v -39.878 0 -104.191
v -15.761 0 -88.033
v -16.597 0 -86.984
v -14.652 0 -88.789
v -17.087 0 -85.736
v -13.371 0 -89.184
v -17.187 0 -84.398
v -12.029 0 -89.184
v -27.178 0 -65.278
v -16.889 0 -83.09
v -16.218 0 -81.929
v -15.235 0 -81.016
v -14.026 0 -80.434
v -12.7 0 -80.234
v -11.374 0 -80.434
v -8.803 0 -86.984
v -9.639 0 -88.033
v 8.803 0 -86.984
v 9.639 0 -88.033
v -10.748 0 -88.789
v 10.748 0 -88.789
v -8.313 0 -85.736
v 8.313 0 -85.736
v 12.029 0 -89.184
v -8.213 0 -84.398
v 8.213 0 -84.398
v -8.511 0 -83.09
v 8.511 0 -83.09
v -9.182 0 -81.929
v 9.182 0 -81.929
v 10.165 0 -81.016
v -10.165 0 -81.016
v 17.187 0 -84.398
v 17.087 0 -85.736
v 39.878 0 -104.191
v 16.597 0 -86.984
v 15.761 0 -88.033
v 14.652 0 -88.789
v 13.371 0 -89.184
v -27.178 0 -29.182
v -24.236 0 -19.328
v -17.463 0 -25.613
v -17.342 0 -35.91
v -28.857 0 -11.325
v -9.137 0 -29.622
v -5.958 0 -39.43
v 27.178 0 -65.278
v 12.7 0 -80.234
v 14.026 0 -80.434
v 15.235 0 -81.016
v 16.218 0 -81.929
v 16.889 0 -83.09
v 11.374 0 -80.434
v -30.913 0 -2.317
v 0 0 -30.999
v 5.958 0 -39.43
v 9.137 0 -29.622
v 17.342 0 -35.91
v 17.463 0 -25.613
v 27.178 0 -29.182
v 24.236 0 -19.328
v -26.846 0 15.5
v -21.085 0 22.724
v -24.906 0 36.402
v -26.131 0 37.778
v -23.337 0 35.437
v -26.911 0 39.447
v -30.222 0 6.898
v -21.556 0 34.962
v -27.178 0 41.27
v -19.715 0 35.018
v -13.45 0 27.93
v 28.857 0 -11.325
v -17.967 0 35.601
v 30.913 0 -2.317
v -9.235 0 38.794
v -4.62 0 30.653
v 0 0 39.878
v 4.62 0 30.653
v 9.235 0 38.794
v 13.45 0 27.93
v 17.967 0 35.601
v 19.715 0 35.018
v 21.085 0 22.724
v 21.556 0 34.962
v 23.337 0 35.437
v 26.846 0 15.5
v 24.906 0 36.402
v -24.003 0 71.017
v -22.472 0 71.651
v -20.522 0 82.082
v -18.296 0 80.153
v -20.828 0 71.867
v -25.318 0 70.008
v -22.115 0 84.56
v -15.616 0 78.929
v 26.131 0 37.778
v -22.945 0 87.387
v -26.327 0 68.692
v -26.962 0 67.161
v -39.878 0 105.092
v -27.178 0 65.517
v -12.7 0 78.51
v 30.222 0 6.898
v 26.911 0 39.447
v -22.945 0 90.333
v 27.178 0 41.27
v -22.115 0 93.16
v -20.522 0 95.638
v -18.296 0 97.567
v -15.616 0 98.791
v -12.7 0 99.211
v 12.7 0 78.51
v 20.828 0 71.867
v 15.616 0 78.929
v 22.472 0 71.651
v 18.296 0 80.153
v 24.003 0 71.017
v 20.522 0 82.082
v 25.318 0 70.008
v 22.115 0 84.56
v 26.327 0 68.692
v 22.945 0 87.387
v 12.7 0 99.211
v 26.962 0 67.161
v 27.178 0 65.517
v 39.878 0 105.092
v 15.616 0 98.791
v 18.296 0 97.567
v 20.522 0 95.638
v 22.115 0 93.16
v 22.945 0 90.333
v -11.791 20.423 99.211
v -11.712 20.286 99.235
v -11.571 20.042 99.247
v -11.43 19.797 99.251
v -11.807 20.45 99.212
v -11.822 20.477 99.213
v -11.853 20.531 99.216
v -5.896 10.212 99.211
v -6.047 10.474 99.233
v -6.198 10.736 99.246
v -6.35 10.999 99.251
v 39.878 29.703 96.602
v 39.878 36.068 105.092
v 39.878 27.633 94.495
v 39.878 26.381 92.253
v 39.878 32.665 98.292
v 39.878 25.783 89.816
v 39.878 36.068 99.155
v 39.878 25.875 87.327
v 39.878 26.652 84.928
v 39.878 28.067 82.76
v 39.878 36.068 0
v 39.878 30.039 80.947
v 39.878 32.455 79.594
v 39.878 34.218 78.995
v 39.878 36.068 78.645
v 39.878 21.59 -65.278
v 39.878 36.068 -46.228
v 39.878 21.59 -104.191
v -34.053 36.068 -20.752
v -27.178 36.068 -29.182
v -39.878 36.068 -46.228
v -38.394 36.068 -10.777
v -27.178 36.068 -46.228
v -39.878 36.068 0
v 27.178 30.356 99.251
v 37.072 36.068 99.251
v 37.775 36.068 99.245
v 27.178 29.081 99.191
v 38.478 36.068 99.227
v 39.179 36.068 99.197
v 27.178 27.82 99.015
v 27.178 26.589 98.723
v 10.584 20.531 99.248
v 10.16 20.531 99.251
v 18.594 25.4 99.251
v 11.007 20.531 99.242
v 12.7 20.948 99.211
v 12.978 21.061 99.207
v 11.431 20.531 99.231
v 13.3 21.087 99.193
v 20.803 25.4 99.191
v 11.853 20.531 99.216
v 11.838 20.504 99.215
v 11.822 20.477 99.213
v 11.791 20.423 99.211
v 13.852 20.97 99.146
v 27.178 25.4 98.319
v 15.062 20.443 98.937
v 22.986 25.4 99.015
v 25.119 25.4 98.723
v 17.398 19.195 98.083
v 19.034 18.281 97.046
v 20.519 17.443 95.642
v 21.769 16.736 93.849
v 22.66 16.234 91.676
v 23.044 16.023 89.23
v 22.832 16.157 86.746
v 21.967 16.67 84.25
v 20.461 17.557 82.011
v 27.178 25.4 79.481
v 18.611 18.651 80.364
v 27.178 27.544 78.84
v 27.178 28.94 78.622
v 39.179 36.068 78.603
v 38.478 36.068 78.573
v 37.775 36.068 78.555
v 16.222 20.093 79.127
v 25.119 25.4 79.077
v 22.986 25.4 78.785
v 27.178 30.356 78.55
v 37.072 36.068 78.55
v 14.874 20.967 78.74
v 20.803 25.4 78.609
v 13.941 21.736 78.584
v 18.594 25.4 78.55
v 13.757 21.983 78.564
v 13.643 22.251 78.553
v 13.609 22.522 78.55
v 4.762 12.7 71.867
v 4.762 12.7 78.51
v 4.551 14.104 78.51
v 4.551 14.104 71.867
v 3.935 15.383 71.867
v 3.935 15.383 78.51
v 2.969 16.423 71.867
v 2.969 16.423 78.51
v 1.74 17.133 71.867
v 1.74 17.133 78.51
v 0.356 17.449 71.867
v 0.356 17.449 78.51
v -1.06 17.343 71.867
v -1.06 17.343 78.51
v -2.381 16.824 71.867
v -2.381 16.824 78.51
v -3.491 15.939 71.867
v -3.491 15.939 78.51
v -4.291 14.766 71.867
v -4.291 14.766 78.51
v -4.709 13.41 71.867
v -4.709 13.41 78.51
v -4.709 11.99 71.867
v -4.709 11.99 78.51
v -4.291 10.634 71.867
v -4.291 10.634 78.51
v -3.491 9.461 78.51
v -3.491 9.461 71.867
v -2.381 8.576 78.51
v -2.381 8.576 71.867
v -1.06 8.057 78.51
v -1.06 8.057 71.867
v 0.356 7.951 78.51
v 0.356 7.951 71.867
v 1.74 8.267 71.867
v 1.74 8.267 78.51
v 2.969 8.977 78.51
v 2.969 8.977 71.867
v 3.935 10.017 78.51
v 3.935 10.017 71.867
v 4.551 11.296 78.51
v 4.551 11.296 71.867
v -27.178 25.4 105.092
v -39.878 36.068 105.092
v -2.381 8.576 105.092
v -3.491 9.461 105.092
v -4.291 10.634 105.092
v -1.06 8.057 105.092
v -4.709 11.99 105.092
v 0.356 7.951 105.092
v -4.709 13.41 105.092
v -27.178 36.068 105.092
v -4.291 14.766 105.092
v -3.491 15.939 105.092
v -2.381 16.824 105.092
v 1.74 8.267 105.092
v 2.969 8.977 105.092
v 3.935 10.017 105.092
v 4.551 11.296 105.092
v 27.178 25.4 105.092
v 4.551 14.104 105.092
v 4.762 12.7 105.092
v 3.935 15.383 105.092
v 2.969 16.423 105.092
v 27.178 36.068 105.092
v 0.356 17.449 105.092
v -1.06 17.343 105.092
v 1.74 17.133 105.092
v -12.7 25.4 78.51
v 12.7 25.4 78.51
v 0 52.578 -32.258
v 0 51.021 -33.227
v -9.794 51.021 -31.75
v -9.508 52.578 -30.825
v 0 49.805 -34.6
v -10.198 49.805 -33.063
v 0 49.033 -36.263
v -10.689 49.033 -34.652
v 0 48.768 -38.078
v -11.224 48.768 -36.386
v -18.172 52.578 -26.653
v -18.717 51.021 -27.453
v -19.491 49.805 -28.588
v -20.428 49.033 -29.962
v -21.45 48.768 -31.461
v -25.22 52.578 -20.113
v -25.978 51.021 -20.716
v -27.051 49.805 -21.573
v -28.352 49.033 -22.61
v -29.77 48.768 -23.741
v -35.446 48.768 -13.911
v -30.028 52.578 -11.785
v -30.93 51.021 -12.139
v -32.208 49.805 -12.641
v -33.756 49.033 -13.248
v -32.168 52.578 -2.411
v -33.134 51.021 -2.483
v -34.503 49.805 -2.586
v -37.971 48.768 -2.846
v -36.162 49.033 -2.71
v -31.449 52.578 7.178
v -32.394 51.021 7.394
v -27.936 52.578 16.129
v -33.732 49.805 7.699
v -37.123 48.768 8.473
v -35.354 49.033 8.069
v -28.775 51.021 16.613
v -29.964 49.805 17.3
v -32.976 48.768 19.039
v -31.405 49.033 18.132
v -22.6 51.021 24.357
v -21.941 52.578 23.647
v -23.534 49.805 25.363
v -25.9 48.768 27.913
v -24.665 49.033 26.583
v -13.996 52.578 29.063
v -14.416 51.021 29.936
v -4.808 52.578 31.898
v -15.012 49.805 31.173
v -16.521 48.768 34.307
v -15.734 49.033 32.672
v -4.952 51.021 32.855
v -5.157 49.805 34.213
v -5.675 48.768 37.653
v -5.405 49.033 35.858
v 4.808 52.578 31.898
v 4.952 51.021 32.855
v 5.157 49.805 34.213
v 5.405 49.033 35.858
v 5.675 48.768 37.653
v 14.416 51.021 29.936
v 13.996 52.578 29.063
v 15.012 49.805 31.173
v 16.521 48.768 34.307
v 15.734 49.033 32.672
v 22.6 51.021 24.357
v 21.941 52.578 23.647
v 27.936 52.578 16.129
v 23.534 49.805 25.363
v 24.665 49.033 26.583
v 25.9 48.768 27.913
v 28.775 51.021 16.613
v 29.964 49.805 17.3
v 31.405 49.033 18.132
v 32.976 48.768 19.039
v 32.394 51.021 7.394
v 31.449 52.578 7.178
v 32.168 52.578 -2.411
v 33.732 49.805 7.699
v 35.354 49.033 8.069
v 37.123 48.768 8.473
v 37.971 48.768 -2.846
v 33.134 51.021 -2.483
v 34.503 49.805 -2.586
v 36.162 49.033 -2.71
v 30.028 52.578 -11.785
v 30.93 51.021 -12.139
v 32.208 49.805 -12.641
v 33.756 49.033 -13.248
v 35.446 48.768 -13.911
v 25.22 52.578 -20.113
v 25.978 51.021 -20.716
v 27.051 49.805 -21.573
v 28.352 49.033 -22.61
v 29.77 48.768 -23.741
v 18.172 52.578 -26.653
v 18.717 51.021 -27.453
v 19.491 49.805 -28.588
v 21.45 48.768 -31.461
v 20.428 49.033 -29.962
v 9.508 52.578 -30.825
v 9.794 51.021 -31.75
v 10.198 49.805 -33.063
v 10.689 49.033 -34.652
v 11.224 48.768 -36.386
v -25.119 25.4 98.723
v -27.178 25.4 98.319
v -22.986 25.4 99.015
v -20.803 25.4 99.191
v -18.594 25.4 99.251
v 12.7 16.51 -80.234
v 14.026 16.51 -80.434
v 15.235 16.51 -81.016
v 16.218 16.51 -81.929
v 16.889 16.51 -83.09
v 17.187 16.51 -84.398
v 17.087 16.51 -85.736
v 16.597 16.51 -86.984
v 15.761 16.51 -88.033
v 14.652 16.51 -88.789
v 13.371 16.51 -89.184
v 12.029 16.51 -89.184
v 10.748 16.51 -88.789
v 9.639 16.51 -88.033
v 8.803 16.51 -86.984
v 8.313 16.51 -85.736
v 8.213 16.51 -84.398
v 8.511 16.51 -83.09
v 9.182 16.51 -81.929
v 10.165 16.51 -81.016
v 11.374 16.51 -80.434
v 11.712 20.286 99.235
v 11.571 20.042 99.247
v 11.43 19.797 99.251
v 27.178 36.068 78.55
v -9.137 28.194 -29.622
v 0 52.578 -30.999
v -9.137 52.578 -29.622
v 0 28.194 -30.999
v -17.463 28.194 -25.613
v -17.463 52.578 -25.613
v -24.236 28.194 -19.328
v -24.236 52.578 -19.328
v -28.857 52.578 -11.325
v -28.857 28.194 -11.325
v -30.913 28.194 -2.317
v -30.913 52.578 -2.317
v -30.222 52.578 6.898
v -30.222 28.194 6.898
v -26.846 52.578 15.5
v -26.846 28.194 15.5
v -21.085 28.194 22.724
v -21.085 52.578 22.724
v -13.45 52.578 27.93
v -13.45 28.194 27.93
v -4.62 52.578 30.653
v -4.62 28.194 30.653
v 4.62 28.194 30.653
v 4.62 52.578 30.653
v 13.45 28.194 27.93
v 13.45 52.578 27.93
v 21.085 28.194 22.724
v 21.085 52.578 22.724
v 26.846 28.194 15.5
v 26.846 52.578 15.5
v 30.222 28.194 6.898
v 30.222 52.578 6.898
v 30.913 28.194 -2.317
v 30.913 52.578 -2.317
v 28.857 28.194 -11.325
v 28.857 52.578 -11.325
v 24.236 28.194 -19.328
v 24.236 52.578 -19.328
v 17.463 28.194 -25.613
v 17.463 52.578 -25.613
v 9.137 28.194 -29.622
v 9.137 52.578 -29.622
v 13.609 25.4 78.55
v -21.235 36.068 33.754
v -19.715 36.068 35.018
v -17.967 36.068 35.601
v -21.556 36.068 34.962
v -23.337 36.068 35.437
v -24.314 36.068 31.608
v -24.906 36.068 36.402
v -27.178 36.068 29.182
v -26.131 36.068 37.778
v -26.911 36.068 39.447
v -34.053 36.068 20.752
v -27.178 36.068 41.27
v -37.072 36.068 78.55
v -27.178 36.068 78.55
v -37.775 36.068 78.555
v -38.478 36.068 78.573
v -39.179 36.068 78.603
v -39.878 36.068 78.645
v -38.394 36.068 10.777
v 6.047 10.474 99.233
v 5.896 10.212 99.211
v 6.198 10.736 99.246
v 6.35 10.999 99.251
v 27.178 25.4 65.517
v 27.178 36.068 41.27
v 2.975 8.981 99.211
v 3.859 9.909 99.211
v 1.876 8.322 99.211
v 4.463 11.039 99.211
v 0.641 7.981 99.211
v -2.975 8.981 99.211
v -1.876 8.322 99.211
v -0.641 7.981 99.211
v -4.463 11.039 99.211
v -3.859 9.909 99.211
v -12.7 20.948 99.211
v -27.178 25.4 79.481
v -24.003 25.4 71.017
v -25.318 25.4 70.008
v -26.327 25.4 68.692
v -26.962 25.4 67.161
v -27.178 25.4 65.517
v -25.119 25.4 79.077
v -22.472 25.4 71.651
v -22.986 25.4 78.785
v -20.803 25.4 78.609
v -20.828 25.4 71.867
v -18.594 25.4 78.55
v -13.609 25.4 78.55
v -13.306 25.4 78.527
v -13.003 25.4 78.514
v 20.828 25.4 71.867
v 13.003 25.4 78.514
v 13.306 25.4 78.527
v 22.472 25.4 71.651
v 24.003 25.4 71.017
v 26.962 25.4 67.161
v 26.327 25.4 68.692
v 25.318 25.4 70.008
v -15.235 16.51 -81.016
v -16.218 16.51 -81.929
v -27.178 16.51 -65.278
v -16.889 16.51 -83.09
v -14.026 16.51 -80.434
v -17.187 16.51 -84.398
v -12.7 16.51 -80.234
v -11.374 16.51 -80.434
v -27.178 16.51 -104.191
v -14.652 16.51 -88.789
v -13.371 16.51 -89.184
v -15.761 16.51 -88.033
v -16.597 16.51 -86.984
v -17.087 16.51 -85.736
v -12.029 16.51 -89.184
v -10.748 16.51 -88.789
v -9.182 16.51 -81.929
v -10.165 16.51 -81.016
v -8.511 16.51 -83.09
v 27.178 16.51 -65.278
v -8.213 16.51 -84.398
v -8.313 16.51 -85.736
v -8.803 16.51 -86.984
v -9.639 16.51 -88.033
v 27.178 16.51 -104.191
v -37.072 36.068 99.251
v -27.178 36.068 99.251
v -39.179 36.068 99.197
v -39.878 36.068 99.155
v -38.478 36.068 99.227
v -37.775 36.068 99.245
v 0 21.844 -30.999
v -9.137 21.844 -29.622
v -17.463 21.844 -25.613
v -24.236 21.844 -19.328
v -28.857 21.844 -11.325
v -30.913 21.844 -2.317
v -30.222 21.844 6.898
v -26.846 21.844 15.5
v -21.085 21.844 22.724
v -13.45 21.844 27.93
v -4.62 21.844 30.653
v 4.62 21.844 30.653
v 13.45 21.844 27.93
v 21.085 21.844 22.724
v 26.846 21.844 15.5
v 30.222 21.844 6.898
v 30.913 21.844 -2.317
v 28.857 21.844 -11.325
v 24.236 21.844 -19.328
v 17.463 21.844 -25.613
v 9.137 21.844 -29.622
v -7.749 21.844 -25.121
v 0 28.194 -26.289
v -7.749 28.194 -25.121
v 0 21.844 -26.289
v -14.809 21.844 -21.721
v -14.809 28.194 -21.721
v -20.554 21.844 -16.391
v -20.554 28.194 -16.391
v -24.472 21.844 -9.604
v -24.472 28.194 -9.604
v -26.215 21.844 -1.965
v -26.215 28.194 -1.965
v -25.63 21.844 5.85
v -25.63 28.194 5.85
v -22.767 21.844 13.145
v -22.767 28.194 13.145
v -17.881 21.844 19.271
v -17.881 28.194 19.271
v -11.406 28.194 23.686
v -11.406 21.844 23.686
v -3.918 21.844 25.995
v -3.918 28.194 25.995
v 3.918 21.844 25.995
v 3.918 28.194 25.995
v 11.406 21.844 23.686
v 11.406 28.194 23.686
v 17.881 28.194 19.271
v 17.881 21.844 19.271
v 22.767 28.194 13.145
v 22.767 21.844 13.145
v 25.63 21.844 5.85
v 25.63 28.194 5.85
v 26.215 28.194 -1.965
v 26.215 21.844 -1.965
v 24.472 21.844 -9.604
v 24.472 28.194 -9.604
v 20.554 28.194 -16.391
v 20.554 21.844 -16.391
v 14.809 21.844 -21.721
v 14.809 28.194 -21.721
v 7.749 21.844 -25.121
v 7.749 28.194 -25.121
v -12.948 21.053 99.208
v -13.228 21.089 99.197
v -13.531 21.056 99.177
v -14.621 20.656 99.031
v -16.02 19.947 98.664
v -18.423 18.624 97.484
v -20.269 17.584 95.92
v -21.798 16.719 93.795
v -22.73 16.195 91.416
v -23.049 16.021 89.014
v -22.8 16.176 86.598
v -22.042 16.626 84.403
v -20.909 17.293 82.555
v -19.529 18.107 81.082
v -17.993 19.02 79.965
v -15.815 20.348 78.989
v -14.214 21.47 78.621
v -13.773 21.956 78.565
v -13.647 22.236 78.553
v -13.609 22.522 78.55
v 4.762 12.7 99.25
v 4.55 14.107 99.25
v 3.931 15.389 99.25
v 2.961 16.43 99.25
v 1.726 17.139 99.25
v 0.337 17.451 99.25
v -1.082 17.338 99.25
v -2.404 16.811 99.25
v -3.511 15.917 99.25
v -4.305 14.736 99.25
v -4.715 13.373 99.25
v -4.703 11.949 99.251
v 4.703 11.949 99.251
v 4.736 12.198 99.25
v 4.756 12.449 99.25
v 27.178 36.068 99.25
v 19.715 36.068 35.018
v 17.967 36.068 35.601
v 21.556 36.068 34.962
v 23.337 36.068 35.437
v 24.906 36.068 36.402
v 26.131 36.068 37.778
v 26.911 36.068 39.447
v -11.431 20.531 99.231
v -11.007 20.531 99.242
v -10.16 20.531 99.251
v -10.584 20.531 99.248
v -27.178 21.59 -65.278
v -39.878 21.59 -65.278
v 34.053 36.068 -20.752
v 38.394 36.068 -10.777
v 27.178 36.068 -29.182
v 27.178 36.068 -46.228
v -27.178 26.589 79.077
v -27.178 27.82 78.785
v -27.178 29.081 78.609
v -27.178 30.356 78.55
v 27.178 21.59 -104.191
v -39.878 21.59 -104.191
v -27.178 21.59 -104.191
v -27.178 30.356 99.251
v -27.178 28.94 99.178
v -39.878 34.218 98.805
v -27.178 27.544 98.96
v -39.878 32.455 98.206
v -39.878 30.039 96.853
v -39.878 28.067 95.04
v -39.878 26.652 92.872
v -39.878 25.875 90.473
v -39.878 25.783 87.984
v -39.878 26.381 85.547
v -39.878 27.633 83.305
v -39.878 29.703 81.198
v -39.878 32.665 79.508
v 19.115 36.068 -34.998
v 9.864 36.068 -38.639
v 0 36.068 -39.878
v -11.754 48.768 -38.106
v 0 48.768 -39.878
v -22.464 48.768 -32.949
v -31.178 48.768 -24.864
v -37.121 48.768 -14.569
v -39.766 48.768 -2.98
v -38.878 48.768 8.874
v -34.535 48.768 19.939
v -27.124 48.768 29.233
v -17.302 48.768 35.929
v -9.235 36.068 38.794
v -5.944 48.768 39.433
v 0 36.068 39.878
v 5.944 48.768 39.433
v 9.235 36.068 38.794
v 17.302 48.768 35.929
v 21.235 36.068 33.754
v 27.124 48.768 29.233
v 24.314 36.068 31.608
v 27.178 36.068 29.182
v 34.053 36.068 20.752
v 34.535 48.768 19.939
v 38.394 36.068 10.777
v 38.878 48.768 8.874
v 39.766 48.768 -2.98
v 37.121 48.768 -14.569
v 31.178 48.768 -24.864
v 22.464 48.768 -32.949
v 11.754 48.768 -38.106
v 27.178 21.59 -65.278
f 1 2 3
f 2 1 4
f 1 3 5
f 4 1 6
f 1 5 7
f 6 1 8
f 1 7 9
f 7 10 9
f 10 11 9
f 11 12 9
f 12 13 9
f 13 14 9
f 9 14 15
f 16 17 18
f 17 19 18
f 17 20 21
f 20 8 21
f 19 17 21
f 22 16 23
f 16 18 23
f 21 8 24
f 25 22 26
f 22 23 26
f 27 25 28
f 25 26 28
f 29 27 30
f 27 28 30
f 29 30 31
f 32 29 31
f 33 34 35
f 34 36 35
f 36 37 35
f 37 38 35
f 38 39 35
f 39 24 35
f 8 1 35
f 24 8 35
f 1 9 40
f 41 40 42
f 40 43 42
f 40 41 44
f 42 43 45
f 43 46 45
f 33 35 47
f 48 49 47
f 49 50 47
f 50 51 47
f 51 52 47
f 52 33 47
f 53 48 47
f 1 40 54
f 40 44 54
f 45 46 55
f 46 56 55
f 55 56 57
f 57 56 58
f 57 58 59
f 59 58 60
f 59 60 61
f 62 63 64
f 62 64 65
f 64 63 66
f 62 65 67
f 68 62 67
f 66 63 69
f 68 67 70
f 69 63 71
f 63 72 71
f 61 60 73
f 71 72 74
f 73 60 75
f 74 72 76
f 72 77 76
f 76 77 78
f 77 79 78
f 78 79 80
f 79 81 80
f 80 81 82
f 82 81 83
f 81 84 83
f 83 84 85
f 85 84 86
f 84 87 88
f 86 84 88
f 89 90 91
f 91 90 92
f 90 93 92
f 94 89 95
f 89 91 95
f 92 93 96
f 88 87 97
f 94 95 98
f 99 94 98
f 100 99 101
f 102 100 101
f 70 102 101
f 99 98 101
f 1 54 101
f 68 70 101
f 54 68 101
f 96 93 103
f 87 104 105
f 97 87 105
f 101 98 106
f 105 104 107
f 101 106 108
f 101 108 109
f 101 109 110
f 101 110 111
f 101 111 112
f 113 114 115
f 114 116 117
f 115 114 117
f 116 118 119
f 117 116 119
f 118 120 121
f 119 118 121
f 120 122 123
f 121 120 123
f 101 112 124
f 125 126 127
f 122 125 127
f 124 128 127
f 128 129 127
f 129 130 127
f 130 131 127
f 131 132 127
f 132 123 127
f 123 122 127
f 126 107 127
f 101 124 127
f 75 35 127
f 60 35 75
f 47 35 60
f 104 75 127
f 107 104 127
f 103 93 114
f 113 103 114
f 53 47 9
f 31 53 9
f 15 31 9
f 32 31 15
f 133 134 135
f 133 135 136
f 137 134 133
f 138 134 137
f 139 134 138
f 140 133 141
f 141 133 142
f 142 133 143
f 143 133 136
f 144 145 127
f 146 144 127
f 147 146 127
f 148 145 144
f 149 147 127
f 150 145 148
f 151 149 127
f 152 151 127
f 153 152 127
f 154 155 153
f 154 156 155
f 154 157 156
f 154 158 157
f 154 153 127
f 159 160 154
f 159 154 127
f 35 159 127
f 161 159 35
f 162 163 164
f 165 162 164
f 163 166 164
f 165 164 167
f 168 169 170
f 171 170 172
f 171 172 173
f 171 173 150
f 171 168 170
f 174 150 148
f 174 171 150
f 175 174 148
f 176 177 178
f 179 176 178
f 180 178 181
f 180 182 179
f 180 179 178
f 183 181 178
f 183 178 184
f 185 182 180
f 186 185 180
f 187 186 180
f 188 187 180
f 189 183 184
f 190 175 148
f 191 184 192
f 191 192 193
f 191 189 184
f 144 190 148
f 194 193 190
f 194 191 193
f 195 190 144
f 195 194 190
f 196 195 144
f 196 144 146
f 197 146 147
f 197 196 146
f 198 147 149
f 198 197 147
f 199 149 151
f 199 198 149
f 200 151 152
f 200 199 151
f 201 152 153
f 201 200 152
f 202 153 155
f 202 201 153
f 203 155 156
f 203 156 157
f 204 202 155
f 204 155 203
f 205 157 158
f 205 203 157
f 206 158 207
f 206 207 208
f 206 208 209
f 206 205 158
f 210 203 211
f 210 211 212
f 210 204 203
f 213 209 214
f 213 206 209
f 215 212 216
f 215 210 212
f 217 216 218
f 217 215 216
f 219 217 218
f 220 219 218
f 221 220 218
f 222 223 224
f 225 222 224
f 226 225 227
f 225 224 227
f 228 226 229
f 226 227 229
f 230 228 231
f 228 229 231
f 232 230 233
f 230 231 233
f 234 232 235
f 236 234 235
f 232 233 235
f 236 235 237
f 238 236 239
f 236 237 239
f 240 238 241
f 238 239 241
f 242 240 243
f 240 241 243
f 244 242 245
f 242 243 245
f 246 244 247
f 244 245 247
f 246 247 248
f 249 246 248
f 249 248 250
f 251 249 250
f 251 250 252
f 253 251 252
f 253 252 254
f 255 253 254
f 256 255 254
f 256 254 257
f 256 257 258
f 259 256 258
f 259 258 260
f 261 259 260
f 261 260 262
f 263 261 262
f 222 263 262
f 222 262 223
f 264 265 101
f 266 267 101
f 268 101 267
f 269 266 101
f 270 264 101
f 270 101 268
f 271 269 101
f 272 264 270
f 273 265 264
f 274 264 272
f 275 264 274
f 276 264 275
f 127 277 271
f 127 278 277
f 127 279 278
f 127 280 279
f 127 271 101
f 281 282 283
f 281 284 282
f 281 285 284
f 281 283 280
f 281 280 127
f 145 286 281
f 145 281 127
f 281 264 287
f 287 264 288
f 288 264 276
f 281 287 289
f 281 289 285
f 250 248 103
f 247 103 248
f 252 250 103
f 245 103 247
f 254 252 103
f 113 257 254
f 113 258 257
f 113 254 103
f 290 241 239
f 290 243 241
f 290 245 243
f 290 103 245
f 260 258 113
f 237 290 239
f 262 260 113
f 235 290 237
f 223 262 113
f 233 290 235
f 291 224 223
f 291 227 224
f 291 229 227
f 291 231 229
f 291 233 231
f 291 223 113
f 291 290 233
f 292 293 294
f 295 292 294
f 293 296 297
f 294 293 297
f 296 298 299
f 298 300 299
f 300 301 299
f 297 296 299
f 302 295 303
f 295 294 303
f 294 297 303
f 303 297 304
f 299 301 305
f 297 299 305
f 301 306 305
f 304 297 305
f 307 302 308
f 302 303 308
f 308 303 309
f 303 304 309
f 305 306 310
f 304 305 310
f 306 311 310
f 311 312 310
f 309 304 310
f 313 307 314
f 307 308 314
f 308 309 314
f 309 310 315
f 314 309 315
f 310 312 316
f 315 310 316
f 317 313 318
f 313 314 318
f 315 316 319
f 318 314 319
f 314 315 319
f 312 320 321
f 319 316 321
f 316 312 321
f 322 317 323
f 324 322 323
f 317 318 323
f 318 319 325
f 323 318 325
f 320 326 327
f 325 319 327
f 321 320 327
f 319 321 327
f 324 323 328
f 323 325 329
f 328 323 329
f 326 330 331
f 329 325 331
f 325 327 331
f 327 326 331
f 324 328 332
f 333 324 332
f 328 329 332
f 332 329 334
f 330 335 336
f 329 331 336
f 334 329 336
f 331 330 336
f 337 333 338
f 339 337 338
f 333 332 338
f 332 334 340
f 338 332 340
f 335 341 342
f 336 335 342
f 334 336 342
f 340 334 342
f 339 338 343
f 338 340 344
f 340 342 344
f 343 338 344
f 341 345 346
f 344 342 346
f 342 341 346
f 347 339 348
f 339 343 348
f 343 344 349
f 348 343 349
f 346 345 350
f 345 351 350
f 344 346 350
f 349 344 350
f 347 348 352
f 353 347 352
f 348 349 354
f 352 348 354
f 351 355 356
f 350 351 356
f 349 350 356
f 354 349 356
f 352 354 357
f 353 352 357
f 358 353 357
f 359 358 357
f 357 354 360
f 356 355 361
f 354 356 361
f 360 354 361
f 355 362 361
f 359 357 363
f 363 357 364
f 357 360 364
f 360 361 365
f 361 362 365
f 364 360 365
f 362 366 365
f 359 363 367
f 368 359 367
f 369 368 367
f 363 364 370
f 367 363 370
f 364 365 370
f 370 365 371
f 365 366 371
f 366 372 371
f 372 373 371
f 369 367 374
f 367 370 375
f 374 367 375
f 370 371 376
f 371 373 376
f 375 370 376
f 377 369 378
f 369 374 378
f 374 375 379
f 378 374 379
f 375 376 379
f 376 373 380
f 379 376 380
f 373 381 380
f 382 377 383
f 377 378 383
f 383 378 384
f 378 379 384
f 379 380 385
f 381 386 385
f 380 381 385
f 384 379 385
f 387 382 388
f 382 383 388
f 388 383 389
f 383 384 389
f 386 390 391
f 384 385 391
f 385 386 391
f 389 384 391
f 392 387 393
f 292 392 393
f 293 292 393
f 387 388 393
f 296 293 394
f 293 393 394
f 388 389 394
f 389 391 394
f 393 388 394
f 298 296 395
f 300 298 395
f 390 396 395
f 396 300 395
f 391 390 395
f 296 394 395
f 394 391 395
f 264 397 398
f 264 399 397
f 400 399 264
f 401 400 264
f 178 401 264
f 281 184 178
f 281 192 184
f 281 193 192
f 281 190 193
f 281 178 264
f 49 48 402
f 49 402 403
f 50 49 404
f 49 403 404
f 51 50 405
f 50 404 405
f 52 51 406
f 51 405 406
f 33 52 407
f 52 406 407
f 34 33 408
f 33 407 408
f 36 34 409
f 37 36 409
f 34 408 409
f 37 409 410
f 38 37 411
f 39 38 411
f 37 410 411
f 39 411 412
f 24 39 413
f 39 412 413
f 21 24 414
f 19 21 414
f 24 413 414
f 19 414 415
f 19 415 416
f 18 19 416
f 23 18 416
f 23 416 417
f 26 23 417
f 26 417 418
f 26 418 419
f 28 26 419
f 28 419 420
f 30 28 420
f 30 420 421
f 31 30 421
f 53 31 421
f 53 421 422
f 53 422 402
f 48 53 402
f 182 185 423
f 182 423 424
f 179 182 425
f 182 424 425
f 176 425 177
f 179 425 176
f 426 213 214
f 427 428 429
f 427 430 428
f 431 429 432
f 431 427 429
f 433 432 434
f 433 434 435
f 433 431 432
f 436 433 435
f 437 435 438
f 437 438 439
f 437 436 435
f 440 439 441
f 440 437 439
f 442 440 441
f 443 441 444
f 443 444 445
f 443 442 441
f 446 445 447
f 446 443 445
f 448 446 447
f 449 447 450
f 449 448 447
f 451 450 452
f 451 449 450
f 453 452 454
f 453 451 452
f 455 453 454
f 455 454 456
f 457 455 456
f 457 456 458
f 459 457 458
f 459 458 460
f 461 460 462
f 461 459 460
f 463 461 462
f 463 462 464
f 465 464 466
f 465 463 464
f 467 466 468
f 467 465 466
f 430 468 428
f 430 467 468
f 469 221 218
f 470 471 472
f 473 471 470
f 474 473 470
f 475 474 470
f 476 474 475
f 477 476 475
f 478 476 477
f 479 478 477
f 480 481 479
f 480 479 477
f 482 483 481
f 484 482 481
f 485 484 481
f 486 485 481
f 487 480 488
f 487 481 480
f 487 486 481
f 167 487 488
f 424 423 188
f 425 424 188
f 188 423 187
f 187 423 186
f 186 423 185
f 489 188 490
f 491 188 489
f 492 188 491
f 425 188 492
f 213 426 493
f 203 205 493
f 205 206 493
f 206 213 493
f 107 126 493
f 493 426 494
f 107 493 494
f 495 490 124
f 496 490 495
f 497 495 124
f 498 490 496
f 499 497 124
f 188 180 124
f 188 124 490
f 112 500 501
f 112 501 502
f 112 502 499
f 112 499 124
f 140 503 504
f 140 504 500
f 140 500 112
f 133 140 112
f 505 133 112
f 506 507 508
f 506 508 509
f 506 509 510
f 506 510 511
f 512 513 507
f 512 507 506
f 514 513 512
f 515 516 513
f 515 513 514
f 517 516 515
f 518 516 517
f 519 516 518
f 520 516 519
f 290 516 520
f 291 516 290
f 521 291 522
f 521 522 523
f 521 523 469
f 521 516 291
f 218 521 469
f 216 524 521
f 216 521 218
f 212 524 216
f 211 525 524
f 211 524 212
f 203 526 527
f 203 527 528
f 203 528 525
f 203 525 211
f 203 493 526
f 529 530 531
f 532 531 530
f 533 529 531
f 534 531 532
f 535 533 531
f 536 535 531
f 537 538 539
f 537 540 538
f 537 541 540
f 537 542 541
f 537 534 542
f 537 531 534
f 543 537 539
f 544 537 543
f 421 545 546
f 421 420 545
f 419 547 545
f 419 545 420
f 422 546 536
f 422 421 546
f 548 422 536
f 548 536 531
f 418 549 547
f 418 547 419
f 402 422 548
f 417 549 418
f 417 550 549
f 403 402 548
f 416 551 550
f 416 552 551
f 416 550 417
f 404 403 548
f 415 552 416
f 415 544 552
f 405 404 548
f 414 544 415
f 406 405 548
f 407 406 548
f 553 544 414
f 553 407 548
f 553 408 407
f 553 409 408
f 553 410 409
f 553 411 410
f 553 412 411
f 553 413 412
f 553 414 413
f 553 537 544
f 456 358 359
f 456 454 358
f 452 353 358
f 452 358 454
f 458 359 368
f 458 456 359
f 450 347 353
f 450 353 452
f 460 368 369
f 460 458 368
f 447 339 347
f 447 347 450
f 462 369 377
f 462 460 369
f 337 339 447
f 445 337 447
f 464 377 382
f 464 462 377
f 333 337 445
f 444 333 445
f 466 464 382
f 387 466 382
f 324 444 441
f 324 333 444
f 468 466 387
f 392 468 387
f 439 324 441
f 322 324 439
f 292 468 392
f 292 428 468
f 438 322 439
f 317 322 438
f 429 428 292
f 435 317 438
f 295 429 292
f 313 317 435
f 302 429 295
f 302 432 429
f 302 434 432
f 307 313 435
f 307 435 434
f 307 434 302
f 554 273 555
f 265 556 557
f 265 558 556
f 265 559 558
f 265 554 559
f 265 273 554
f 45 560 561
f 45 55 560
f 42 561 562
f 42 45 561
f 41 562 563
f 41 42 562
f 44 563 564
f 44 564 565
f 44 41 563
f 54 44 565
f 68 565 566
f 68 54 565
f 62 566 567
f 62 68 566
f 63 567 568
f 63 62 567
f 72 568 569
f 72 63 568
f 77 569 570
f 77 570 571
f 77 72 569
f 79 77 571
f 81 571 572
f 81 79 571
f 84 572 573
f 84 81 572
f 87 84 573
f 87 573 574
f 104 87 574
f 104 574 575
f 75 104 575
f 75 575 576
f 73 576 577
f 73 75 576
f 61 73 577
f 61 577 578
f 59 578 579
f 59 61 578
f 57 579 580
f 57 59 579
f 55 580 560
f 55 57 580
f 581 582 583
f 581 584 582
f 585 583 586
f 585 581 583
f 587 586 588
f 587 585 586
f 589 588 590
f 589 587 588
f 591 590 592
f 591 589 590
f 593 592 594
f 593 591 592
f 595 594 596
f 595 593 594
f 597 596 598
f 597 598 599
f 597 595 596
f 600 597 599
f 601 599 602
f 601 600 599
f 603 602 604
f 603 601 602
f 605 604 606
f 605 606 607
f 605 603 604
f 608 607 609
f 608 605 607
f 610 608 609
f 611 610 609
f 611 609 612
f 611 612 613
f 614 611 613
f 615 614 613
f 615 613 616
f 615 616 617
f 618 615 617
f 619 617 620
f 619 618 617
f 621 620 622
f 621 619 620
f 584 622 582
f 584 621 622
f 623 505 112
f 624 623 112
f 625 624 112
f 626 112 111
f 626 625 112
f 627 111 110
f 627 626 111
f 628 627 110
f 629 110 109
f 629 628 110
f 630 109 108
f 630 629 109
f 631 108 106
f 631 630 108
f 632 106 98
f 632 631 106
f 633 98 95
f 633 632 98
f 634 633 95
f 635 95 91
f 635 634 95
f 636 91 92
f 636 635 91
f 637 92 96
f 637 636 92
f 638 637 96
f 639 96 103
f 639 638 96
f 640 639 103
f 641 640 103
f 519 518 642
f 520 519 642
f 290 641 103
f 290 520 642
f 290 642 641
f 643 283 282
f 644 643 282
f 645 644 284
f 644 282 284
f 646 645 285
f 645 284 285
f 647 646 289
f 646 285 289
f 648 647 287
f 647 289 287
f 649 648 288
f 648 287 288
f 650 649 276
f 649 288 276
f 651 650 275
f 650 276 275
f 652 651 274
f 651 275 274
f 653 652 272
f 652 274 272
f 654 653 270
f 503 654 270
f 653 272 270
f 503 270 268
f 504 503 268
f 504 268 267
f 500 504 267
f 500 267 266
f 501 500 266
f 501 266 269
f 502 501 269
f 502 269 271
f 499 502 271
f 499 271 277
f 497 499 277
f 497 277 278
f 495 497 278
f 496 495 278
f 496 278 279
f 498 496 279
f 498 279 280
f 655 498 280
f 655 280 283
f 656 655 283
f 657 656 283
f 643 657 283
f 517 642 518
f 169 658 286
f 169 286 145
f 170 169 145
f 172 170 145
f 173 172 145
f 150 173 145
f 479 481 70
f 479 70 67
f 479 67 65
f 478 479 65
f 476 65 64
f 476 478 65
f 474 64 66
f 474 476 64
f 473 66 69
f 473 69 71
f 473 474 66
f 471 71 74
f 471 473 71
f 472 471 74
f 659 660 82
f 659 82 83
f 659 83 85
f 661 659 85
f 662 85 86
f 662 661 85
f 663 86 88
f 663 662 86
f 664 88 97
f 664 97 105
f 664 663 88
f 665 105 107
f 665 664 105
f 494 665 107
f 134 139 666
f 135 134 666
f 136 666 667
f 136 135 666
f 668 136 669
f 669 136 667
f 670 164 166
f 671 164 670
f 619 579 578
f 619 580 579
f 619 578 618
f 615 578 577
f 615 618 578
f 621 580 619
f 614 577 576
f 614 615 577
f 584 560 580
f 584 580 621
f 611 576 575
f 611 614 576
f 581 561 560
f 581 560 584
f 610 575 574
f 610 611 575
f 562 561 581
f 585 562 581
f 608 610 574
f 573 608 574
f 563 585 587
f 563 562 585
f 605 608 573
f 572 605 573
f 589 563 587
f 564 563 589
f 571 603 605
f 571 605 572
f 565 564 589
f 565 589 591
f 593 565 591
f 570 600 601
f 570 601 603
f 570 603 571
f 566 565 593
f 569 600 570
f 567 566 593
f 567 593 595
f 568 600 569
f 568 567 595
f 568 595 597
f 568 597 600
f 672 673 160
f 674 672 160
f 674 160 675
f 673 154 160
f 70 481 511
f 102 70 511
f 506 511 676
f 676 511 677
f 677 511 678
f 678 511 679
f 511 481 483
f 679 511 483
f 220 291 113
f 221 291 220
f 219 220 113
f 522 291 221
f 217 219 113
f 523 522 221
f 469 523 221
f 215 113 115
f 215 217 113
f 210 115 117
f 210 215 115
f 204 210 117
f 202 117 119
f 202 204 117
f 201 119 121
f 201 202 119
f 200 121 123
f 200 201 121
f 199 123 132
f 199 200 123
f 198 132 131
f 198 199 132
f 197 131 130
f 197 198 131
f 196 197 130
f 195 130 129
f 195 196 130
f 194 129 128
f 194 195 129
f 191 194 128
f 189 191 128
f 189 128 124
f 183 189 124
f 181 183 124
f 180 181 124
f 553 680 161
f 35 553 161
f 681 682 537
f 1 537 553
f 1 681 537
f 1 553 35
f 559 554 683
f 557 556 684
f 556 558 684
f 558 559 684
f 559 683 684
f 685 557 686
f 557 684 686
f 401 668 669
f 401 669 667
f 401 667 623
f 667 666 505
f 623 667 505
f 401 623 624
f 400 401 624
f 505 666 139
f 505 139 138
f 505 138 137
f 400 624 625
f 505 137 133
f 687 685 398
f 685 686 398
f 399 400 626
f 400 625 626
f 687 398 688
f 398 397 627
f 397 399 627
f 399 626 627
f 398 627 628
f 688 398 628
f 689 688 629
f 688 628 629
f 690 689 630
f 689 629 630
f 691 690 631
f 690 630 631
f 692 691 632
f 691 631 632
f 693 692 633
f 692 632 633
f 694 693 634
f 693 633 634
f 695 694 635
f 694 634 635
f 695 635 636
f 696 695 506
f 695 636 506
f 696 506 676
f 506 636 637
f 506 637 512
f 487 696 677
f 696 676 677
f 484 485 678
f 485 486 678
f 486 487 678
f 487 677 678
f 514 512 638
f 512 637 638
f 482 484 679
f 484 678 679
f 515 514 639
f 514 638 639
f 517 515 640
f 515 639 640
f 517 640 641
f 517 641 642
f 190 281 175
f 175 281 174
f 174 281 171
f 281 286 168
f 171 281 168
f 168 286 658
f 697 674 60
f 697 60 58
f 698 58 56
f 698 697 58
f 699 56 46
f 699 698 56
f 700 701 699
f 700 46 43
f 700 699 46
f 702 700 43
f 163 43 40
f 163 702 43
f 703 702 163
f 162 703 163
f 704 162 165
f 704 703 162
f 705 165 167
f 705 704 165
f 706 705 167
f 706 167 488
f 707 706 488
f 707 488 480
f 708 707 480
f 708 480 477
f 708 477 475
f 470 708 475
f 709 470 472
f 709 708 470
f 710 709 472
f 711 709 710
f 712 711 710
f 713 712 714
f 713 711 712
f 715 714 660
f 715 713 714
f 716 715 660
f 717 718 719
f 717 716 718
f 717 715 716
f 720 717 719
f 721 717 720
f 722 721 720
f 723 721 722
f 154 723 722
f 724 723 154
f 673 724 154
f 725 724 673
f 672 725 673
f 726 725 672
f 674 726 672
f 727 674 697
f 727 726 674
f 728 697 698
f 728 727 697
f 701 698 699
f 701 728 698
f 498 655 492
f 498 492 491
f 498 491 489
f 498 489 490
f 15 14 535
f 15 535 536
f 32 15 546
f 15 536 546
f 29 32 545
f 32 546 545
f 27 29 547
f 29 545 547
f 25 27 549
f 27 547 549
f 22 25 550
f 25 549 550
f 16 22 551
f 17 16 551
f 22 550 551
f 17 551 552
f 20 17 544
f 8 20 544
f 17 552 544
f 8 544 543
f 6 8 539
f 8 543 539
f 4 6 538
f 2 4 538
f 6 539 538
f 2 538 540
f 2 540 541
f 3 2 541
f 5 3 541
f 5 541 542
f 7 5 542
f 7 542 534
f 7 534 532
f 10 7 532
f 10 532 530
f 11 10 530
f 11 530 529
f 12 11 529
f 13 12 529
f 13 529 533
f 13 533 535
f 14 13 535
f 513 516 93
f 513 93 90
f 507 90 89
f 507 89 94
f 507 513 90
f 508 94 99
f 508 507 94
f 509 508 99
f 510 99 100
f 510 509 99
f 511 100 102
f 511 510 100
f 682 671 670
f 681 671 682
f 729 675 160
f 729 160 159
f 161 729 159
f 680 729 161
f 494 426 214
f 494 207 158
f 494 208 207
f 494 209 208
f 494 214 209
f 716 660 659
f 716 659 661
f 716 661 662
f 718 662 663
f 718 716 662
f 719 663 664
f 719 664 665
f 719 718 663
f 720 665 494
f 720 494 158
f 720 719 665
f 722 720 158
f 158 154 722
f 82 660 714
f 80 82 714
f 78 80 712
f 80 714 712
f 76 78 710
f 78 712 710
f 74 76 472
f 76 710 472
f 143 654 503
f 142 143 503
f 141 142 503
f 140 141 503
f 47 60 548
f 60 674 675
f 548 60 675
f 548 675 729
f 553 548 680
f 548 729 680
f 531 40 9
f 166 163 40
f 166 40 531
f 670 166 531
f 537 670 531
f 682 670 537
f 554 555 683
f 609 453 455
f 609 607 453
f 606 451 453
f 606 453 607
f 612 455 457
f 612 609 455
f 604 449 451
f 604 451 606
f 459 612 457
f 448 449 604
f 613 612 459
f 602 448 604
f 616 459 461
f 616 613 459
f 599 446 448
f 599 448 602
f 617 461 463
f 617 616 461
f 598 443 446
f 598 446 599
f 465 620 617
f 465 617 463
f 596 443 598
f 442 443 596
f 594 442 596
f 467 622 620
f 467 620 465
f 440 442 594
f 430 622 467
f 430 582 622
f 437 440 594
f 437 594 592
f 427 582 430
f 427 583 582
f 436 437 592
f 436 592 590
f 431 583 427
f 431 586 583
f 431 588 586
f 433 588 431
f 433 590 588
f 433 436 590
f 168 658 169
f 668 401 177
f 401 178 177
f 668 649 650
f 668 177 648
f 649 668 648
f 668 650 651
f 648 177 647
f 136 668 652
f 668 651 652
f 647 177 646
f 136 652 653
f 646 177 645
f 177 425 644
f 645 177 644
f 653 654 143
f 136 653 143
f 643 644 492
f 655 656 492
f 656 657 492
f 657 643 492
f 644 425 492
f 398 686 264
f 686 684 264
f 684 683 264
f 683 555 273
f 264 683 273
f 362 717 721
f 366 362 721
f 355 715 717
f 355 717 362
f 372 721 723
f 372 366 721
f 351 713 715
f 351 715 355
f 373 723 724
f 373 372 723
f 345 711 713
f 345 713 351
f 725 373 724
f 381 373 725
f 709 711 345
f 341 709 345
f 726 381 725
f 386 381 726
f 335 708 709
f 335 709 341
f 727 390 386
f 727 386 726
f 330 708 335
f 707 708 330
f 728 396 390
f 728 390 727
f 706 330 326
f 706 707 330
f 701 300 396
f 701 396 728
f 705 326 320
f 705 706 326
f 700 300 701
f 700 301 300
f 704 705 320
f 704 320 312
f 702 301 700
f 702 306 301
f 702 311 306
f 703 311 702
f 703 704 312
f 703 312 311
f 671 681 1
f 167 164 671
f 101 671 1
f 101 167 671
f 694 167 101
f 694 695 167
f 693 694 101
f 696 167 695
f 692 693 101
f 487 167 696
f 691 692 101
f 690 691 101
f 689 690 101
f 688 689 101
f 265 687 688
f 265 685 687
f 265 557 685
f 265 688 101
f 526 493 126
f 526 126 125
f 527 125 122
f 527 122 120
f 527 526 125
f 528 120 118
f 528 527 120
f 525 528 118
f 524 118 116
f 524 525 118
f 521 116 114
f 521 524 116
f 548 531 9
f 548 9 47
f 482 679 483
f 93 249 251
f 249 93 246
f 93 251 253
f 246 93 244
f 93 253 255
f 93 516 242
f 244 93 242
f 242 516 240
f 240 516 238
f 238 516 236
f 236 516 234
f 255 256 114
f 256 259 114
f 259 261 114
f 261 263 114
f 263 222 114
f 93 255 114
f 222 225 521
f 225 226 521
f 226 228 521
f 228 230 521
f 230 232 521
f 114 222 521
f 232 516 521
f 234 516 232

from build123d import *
from build123d.topology import SkipClean

# Parameters (mm, degrees)
HOUSING_FILLET_LIP_R               = 6.35
UBJ_START                          = 36.068
UBJ_MATERIAL_PREP_DEPTH            = 36.068
UBJ_ARM_TK_DEPTH                   = 79.756
SKETCH32_R                         = 4.5
CAMBERBLOCK_HOLES_DEPTH            = 21.59
SKETCH28_W                         = 54.356
SKETCH28_H                         = 38.9128
UBJ_CROSS_MEMBER_TK_DEPTH          = 5.08
UBJ_MASS_CUTTING_REACH             = 119.247
LBJ_START                          = -36.068
LBJ_MATERIAL_PREP_DEPTH            = 36.068
FLAT_LBJ_PREP_DEPTH                = 10.668
LBJ_SLOT_REACH                     = 117.643
LBJ_WEIGHT_AND_BOLT_CLEARING_REACH = 117.643
LBJ_FILLET_R                       = 6.35
LBJ_HOLE_REACH                     = 221.441
SKETCH14_R                         = 4.7625
MOUTH_WIDEN_DEPTH                  = 125.09324931


with BuildPart() as part:
    # Bearing Sketch → Bearing Revolve (revolve)
    with BuildSketch(Plane(origin=(0, 0, 0), x_dir=(0, 0, -1), z_dir=(1, 0, 0)), mode=Mode.PRIVATE) as bearing_revolve_sk:
        Polygon((-39.878, 0), (-39.878, 48.768), (-32.258, 48.768), (-32.258, 52.578), (-30.99943, 52.578), (-30.99943, 28.194), (-26.289, 28.194), (-26.289, 21.844), (-30.99943, 21.844), (-30.99943, 0), align=None)
    revolve(bearing_revolve_sk.sketch.rotate(Axis((0, 0, 0), (0, 1, 0)), 180), axis=Axis((0, 0, 0), (0, 1, 0)))

    # Housing Fillet Lip
    # the kernel refuses this fillet: 6.35 mm, written as the material it adds along each edge
    with BuildSketch(Plane(origin=(0, 48.768, 0), x_dir=(0, 0, -1), z_dir=(1, 0, 0))) as housing_fillet_lip_piece_1:
        with BuildLine():
            CenterArc((38.077871133, 6.35), HOUSING_FILLET_LIP_R, 203.578178478, 66.421821522)
            Line((32.258, 3.81), (32.141602577, 3.7592))
            ThreePointArc((32.141602577, 3.7592), (32.131, 1.905), (32.131, 0))
            Line((32.131, 0), (32.258, -0.127))
            Line((32.258, -0.127), (38.077871133, -0.127))
            Line((38.077871133, -0.127), (38.077871133, 0))
        make_face()
    revolve(axis=Axis((0, 48.768, 0), (0, 1, 0)))

    # PrepArea(WithadjWidth) → UBJ Material Prep (add)
    with BuildSketch(Plane(origin=(0, 0, 0), x_dir=(1, 0, 0), z_dir=(0, 1, 0)).offset(UBJ_START)):
        with BuildLine():
            Line((-39.878, 0), (-39.878, 46.228))
            Line((-39.878, 46.228), (39.878, 46.228))
            Line((39.878, 46.228), (39.878, 0))
            ThreePointArc((39.878, 0), (0, 39.878), (-39.878, 0))
        make_face()
    extrude(amount=-UBJ_MATERIAL_PREP_DEPTH)

    # Sketch27 → UBJ Arm TK (add)
    with BuildSketch(Plane.ZY.offset(39.878)):
        Polygon((-46.228, 36.068), (-65.278, 21.59), (-104.1908, 21.59), (-104.1908, 0), (-91.959544072, 0), (-46.228, 0), align=None)
    extrude(amount=-UBJ_ARM_TK_DEPTH)

    # Sketch32 → CamberBlock Holes (cut)
    with BuildSketch(Plane(origin=(0, 21.59, 0), x_dir=(1, 0, 0), z_dir=(0, 1, 0))):
        with Locations(Location((-12.7, 84.7344, 0), (0, 0, 270))):
            Circle(SKETCH32_R)
        with Locations(Location((12.7, 84.7344, 0), (0, 0, 270))):
            Circle(SKETCH32_R)
    extrude(amount=-CAMBERBLOCK_HOLES_DEPTH, mode=Mode.SUBTRACT)

    # Sketch28 → UBJ Cross Member TK (cut)
    with BuildSketch(Plane(origin=(0, 21.59, 0), x_dir=(1, 0, 0), z_dir=(0, 1, 0))):
        with Locations((0, 84.7344)):
            Rectangle(SKETCH28_W, SKETCH28_H)
    extrude(amount=-UBJ_CROSS_MEMBER_TK_DEPTH, mode=Mode.SUBTRACT)

    # Sketch30 → UBJ Mass Cutting (cut, up to next)
    with BuildSketch(Plane(origin=(0, 36.068, 0), x_dir=(1, 0, 0), z_dir=(0, 1, 0)), mode=Mode.PRIVATE) as ubj_mass_cutting_sk1:
        with BuildLine():
            Line((-27.178, 65.278), (27.178, 65.278))
            Line((27.178, 65.278), (27.178, 29.182378244))
            ThreePointArc((27.178, 29.182378244), (0, 39.878), (-27.178, 29.182378244))
            Line((-27.178, 29.182378244), (-27.178, 65.278))
        make_face()
    ubj_mass_cutting_tool1 = extrude(ubj_mass_cutting_sk1.sketch, amount=-UBJ_MASS_CUTTING_REACH, mode=Mode.PRIVATE) & part.part
    add(ubj_mass_cutting_tool1.solids().sort_by_distance((0, 36.068, -50.735285))[0], mode=Mode.SUBTRACT)

    # Sketch9 → LBJ Material Prep (add)
    with BuildSketch(Plane.XZ.offset(LBJ_START)):
        with BuildLine():
            Line((-39.878, 0), (-39.878, 105.0925))
            Line((-39.878, 105.0925), (39.878, 105.0925))
            Line((39.878, 105.0925), (39.878, 0))
            ThreePointArc((39.878, 0), (0, 39.878), (-39.878, 0))
        make_face()
    extrude(amount=LBJ_MATERIAL_PREP_DEPTH)

    # Sketch10 → Flat LBJ Prep (cut)
    with SkipClean():  # the faces are left unmerged after this step: merging them gives an invalid solid
        with BuildSketch(Plane(origin=(0, 36.068, 0), x_dir=(1, 0, 0), z_dir=(0, 1, 0))):
            with BuildLine():
                Line((-27.178, -29.182378244), (-27.178, -105.0925))
                Line((-27.178, -105.0925), (27.178, -105.0925))
                Line((27.178, -105.0925), (27.178, -29.182378244))
                ThreePointArc((27.178, -29.182378244), (0, -39.878), (-27.178, -29.182378244))
            make_face()
        extrude(amount=-FLAT_LBJ_PREP_DEPTH, mode=Mode.SUBTRACT)

    # Sketch12 → LBJ Slot (cut, up to next)
    with BuildSketch(Plane(origin=(0, 25.4, 0), x_dir=(1, 0, 0), z_dir=(0, 1, 0)), mode=Mode.PRIVATE) as lbj_slot_sk1:
        with BuildLine():
            Line((-12.7, -78.509539434), (12.7, -78.509539434))
            ThreePointArc((12.7, -78.509539434), (23.0505, -88.860039434), (12.7, -99.210539434))
            Line((12.7, -99.210539434), (-12.7, -99.210539434))
            ThreePointArc((-12.7, -99.210539434), (-23.0505, -88.860039434), (-12.7, -78.509539434))
        make_face()
    lbj_slot_tool1 = extrude(lbj_slot_sk1.sketch, amount=-LBJ_SLOT_REACH, mode=Mode.PRIVATE) & part.part
    add(lbj_slot_tool1.solids().sort_by_distance((0, 25.4, 88.860039))[0], mode=Mode.SUBTRACT)

    # Sketch13 → LBJ Weight and Bolt Clearing (cut, up to next)
    with BuildSketch(Plane(origin=(0, 25.4, 0), x_dir=(1, 0, 0), z_dir=(0, 1, 0)), mode=Mode.PRIVATE) as lbj_weight_and_bolt_clearing_sk1:
        with BuildLine():
            Line((-27.178, -29.182378244), (-27.178, -71.867439434))
            Line((-27.178, -71.867439434), (27.178, -71.867439434))
            Line((27.178, -71.867439434), (27.178, -29.182378244))
            ThreePointArc((27.178, -29.182378244), (0, -39.878), (-27.178, -29.182378244))
        make_face()
    lbj_weight_and_bolt_clearing_tool1 = extrude(lbj_weight_and_bolt_clearing_sk1.sketch, amount=-LBJ_WEIGHT_AND_BOLT_CLEARING_REACH, mode=Mode.PRIVATE) & part.part
    add(lbj_weight_and_bolt_clearing_tool1.solids().sort_by_distance((0, 25.4, 54.061372))[0], mode=Mode.SUBTRACT)

    # LBJ Fillet
    # the kernel refuses this fillet: 6.35 mm, written as the material it adds along each edge
    with BuildSketch(Plane(origin=(-27.178, 25.4, 29.182378244), x_dir=(0.8204405839916299, 0, 0.5717317973835926), z_dir=(0, -1, 0))) as lbj_fillet_piece_1:
        with BuildLine():
            CenterArc((12.120741225, 6.286772968), LBJ_FILLET_R, 145.128922247, 116.778941593)
            Line((6.910943516, 9.917269881), (0, 0))
            ThreePointArc((0, 0), (5.613440626, 0.397065762), (11.226881252, 0))
        make_face()
    extrude(amount=25.4)
    with BuildSketch(Plane(origin=(27.178, 25.4, 29.182378244), x_dir=(-0.8204405839916303, 0, 0.5717317973835919), z_dir=(0, -1, 0))) as lbj_fillet_piece_2:
        with BuildLine():
            CenterArc((12.120741225, -6.286772968), LBJ_FILLET_R, 98.09213616, 116.778941593)
            Line((6.910943516, -9.917269881), (0, 0))
            ThreePointArc((0, 0), (5.613440626, -0.397065762), (11.226881252, 0))
        make_face()
    extrude(amount=25.4)
    with BuildSketch(Plane(origin=(27.178, 25.4, 71.867439434), x_dir=(0, 0, -1), z_dir=(0, -1, 0)), Plane(origin=(-27.178, 25.4, 71.867439434), x_dir=(1, 0, 0), z_dir=(0, -1, 0))) as lbj_fillet_piece_3:
        with BuildLine():
            CenterArc((LBJ_FILLET_R, -LBJ_FILLET_R), LBJ_FILLET_R, 90, 90)
            Line((0, -LBJ_FILLET_R), (0, 0))
            Line((0, 0), (LBJ_FILLET_R, 0))
        make_face()
    extrude(amount=25.4)
    with BuildSketch(Plane(origin=(27.178, 36.068, 29.182378244), x_dir=(-0.8204405839916303, 0, 0.5717317973835919), z_dir=(0, -1, 0))) as lbj_fillet_piece_4:
        with BuildLine():
            CenterArc((12.120741225, -6.286772968), LBJ_FILLET_R, 98.09213616, 116.778941593)
            Line((6.910943516, -9.917269881), (0, 0))
            ThreePointArc((0, 0), (5.613440626, -0.397065762), (11.226881252, 0))
        make_face()
    extrude(amount=10.668)
    with BuildSketch(Plane(origin=(-27.178, 36.068, 29.182378244), x_dir=(0.8204405839916299, 0, 0.5717317973835926), z_dir=(0, -1, 0))) as lbj_fillet_piece_5:
        with BuildLine():
            CenterArc((12.120741225, 6.286772968), LBJ_FILLET_R, 145.128922247, 116.778941593)
            Line((6.910943516, 9.917269881), (0, 0))
            ThreePointArc((0, 0), (5.613440626, 0.397065762), (11.226881252, 0))
        make_face()
    extrude(amount=10.668)

    # LBJ Hole: up to this face of the body (flat: up to its plane)
    lbj_hole_end = Plane(part.part.faces().sort_by_distance((0, 12.7, 71.867439434))[0])
    # Sketch14 → LBJ Hole (cut, up to the picked face)
    with BuildSketch(Plane.XY.offset(105.0925), mode=Mode.PRIVATE) as lbj_hole_sk1:
        with Locations((0, 12.7)):
            Circle(SKETCH14_R)
    lbj_hole_tool1 = split(extrude(lbj_hole_sk1.sketch, amount=-LBJ_HOLE_REACH, mode=Mode.PRIVATE), bisect_by=lbj_hole_end, keep=Keep.BOTH, mode=Mode.PRIVATE)
    add(lbj_hole_tool1.solids().sort_by(Axis((0, 12.7, 105.0925), (0, 0, -1)))[0], mode=Mode.SUBTRACT)

    # Sketch33 → Mouth Widen (cut, through all)
    with BuildSketch(Plane(origin=(0, 0, 0), x_dir=(0, 0, 1), z_dir=(-0.8660254037844398, 0.499999999999998, 0))):
        with BuildLine():
            Line((78.5495, 12.7), (78.5495, 22.86))
            ThreePointArc((78.5495, 22.86), (88.9, 33.2105), (99.2505, 22.86))
            Line((99.2505, 22.86), (99.2505, 12.7))
            ThreePointArc((99.2505, 12.7), (88.9, 2.3495), (78.5495, 12.7))
        make_face()
    mouth_widen = extrude(amount=MOUTH_WIDEN_DEPTH, mode=Mode.SUBTRACT)

    # Mouth Mirror: Mouth Widen across plane
    add(mouth_widen.mirror(Plane(origin=(0, 0, 0), x_dir=(0, 0, 1), z_dir=(1, 0, 0))), mode=Mode.SUBTRACT)


solid = part.part
